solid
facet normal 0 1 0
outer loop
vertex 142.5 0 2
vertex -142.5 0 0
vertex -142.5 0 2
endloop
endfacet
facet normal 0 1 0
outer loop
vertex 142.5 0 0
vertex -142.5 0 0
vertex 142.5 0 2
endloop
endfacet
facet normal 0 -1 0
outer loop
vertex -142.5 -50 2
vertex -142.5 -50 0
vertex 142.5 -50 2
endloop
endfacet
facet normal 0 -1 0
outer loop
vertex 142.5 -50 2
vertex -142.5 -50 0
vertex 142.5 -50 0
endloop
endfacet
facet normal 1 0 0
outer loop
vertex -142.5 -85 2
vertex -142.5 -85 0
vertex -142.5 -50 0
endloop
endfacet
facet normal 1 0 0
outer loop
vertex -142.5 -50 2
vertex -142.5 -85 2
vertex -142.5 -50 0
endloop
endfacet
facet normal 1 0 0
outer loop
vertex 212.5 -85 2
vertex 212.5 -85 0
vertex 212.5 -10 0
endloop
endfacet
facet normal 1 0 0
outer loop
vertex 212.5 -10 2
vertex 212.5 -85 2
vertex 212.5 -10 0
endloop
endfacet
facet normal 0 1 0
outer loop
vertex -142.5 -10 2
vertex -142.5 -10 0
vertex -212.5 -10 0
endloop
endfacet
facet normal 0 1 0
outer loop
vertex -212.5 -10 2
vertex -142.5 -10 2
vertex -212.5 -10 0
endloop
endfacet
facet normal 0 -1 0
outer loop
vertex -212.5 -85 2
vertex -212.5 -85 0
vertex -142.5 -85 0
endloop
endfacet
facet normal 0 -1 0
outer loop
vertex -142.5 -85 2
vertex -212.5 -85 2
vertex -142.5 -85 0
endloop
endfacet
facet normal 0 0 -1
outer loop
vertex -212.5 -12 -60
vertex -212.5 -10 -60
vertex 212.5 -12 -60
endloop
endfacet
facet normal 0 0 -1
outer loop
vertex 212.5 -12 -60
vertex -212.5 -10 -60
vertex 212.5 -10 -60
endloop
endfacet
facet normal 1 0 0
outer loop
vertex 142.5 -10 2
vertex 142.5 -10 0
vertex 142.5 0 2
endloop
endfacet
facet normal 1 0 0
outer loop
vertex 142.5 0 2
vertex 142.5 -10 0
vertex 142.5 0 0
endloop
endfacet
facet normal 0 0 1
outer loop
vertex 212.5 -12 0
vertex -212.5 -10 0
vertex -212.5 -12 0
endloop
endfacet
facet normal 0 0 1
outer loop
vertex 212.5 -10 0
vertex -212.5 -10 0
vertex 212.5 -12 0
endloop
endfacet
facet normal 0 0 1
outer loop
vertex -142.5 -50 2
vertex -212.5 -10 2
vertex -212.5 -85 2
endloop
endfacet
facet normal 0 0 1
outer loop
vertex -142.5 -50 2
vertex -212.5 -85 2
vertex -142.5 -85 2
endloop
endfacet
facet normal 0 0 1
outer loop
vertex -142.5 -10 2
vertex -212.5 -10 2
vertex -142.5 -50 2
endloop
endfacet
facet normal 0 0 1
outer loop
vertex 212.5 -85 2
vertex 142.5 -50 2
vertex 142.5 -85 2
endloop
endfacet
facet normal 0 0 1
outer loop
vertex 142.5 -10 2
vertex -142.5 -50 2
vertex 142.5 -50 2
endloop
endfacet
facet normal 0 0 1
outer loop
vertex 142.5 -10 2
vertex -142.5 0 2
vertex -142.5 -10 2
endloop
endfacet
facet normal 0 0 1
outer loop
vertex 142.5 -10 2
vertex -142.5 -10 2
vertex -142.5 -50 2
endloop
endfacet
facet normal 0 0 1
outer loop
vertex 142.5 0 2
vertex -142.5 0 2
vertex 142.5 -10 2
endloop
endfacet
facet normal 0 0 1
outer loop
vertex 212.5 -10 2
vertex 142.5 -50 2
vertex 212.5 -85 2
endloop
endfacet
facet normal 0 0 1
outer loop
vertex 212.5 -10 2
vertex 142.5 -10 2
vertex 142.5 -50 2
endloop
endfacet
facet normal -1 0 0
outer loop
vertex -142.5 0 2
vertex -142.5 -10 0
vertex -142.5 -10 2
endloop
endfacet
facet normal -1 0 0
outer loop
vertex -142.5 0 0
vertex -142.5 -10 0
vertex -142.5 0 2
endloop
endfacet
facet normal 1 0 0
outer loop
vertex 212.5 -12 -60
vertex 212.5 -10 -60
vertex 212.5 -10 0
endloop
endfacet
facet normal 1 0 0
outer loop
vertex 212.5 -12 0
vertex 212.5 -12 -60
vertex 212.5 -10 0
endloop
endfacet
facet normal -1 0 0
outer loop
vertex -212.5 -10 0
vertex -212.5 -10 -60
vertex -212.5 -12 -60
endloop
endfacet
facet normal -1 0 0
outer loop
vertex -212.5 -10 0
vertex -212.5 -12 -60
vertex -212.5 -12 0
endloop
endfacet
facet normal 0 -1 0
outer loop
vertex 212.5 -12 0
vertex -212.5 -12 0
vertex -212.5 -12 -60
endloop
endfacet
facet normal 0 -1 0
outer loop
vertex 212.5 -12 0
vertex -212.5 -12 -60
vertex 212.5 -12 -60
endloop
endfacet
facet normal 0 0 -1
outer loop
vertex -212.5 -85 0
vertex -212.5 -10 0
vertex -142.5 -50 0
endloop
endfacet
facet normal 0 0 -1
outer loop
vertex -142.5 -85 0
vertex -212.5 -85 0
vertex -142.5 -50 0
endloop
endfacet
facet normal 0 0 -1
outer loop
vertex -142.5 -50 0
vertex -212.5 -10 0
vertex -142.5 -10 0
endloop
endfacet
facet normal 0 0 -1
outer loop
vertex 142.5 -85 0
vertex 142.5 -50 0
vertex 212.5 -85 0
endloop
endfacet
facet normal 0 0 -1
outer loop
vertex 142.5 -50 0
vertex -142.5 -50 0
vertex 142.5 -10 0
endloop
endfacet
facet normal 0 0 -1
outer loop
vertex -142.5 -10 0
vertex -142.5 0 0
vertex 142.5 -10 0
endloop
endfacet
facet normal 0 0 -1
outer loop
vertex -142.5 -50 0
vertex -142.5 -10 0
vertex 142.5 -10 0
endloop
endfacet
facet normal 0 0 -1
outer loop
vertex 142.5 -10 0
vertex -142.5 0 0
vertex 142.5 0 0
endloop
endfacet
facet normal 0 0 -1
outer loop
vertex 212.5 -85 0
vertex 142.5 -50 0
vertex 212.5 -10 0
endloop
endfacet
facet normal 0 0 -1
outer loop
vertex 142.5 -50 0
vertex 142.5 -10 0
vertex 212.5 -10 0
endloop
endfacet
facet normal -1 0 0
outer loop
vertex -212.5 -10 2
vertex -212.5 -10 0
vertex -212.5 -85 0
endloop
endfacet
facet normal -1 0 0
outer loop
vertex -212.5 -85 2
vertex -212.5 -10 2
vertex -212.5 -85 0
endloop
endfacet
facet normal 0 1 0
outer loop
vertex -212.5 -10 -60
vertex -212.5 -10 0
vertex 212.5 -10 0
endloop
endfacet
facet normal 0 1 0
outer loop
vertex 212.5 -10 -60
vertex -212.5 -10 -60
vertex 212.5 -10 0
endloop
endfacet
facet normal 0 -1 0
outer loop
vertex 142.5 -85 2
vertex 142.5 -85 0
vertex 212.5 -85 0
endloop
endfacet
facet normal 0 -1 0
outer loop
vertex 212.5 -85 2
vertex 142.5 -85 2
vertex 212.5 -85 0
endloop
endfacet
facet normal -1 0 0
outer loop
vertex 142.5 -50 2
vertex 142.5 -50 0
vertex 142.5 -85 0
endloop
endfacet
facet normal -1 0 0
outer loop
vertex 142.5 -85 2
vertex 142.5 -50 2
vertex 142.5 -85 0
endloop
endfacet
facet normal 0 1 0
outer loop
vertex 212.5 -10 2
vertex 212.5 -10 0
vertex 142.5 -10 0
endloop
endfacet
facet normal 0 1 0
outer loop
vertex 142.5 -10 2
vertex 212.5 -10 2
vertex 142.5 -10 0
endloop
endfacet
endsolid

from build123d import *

# Parameters (mm, degrees)
F0_W     = 285
F0_H     = 40
F0_H_2   = 10
F1_DEPTH = 2
F3_W     = 425
F3_H     = 60
F4_DEPTH = 2


with BuildPart() as f1:
    # F0 (on Top) → F1 (new body)
    with BuildSketch(Plane.XY):
        Polygon((-142.5, -50), (-142.5, -10), (-212.5, -10), (-212.5, -85), (-142.5, -85), align=None)
        with Locations((0, -30)):
            Rectangle(F0_W, F0_H)
        with Locations((0, -5)):
            Rectangle(F0_W, F0_H_2)
        Polygon((212.5, -10), (142.5, -10), (142.5, -50), (142.5, -85), (212.5, -85), align=None)
    extrude(amount=F1_DEPTH)


with BuildPart() as f4:
    # F3 (on offset) → F4 (new body)
    with BuildSketch(Plane.XZ.offset(10)):
        with Locations((0, -30)):
            Rectangle(F3_W, F3_H)
    extrude(amount=F4_DEPTH)


solid = Compound([f1.part, f4.part])
